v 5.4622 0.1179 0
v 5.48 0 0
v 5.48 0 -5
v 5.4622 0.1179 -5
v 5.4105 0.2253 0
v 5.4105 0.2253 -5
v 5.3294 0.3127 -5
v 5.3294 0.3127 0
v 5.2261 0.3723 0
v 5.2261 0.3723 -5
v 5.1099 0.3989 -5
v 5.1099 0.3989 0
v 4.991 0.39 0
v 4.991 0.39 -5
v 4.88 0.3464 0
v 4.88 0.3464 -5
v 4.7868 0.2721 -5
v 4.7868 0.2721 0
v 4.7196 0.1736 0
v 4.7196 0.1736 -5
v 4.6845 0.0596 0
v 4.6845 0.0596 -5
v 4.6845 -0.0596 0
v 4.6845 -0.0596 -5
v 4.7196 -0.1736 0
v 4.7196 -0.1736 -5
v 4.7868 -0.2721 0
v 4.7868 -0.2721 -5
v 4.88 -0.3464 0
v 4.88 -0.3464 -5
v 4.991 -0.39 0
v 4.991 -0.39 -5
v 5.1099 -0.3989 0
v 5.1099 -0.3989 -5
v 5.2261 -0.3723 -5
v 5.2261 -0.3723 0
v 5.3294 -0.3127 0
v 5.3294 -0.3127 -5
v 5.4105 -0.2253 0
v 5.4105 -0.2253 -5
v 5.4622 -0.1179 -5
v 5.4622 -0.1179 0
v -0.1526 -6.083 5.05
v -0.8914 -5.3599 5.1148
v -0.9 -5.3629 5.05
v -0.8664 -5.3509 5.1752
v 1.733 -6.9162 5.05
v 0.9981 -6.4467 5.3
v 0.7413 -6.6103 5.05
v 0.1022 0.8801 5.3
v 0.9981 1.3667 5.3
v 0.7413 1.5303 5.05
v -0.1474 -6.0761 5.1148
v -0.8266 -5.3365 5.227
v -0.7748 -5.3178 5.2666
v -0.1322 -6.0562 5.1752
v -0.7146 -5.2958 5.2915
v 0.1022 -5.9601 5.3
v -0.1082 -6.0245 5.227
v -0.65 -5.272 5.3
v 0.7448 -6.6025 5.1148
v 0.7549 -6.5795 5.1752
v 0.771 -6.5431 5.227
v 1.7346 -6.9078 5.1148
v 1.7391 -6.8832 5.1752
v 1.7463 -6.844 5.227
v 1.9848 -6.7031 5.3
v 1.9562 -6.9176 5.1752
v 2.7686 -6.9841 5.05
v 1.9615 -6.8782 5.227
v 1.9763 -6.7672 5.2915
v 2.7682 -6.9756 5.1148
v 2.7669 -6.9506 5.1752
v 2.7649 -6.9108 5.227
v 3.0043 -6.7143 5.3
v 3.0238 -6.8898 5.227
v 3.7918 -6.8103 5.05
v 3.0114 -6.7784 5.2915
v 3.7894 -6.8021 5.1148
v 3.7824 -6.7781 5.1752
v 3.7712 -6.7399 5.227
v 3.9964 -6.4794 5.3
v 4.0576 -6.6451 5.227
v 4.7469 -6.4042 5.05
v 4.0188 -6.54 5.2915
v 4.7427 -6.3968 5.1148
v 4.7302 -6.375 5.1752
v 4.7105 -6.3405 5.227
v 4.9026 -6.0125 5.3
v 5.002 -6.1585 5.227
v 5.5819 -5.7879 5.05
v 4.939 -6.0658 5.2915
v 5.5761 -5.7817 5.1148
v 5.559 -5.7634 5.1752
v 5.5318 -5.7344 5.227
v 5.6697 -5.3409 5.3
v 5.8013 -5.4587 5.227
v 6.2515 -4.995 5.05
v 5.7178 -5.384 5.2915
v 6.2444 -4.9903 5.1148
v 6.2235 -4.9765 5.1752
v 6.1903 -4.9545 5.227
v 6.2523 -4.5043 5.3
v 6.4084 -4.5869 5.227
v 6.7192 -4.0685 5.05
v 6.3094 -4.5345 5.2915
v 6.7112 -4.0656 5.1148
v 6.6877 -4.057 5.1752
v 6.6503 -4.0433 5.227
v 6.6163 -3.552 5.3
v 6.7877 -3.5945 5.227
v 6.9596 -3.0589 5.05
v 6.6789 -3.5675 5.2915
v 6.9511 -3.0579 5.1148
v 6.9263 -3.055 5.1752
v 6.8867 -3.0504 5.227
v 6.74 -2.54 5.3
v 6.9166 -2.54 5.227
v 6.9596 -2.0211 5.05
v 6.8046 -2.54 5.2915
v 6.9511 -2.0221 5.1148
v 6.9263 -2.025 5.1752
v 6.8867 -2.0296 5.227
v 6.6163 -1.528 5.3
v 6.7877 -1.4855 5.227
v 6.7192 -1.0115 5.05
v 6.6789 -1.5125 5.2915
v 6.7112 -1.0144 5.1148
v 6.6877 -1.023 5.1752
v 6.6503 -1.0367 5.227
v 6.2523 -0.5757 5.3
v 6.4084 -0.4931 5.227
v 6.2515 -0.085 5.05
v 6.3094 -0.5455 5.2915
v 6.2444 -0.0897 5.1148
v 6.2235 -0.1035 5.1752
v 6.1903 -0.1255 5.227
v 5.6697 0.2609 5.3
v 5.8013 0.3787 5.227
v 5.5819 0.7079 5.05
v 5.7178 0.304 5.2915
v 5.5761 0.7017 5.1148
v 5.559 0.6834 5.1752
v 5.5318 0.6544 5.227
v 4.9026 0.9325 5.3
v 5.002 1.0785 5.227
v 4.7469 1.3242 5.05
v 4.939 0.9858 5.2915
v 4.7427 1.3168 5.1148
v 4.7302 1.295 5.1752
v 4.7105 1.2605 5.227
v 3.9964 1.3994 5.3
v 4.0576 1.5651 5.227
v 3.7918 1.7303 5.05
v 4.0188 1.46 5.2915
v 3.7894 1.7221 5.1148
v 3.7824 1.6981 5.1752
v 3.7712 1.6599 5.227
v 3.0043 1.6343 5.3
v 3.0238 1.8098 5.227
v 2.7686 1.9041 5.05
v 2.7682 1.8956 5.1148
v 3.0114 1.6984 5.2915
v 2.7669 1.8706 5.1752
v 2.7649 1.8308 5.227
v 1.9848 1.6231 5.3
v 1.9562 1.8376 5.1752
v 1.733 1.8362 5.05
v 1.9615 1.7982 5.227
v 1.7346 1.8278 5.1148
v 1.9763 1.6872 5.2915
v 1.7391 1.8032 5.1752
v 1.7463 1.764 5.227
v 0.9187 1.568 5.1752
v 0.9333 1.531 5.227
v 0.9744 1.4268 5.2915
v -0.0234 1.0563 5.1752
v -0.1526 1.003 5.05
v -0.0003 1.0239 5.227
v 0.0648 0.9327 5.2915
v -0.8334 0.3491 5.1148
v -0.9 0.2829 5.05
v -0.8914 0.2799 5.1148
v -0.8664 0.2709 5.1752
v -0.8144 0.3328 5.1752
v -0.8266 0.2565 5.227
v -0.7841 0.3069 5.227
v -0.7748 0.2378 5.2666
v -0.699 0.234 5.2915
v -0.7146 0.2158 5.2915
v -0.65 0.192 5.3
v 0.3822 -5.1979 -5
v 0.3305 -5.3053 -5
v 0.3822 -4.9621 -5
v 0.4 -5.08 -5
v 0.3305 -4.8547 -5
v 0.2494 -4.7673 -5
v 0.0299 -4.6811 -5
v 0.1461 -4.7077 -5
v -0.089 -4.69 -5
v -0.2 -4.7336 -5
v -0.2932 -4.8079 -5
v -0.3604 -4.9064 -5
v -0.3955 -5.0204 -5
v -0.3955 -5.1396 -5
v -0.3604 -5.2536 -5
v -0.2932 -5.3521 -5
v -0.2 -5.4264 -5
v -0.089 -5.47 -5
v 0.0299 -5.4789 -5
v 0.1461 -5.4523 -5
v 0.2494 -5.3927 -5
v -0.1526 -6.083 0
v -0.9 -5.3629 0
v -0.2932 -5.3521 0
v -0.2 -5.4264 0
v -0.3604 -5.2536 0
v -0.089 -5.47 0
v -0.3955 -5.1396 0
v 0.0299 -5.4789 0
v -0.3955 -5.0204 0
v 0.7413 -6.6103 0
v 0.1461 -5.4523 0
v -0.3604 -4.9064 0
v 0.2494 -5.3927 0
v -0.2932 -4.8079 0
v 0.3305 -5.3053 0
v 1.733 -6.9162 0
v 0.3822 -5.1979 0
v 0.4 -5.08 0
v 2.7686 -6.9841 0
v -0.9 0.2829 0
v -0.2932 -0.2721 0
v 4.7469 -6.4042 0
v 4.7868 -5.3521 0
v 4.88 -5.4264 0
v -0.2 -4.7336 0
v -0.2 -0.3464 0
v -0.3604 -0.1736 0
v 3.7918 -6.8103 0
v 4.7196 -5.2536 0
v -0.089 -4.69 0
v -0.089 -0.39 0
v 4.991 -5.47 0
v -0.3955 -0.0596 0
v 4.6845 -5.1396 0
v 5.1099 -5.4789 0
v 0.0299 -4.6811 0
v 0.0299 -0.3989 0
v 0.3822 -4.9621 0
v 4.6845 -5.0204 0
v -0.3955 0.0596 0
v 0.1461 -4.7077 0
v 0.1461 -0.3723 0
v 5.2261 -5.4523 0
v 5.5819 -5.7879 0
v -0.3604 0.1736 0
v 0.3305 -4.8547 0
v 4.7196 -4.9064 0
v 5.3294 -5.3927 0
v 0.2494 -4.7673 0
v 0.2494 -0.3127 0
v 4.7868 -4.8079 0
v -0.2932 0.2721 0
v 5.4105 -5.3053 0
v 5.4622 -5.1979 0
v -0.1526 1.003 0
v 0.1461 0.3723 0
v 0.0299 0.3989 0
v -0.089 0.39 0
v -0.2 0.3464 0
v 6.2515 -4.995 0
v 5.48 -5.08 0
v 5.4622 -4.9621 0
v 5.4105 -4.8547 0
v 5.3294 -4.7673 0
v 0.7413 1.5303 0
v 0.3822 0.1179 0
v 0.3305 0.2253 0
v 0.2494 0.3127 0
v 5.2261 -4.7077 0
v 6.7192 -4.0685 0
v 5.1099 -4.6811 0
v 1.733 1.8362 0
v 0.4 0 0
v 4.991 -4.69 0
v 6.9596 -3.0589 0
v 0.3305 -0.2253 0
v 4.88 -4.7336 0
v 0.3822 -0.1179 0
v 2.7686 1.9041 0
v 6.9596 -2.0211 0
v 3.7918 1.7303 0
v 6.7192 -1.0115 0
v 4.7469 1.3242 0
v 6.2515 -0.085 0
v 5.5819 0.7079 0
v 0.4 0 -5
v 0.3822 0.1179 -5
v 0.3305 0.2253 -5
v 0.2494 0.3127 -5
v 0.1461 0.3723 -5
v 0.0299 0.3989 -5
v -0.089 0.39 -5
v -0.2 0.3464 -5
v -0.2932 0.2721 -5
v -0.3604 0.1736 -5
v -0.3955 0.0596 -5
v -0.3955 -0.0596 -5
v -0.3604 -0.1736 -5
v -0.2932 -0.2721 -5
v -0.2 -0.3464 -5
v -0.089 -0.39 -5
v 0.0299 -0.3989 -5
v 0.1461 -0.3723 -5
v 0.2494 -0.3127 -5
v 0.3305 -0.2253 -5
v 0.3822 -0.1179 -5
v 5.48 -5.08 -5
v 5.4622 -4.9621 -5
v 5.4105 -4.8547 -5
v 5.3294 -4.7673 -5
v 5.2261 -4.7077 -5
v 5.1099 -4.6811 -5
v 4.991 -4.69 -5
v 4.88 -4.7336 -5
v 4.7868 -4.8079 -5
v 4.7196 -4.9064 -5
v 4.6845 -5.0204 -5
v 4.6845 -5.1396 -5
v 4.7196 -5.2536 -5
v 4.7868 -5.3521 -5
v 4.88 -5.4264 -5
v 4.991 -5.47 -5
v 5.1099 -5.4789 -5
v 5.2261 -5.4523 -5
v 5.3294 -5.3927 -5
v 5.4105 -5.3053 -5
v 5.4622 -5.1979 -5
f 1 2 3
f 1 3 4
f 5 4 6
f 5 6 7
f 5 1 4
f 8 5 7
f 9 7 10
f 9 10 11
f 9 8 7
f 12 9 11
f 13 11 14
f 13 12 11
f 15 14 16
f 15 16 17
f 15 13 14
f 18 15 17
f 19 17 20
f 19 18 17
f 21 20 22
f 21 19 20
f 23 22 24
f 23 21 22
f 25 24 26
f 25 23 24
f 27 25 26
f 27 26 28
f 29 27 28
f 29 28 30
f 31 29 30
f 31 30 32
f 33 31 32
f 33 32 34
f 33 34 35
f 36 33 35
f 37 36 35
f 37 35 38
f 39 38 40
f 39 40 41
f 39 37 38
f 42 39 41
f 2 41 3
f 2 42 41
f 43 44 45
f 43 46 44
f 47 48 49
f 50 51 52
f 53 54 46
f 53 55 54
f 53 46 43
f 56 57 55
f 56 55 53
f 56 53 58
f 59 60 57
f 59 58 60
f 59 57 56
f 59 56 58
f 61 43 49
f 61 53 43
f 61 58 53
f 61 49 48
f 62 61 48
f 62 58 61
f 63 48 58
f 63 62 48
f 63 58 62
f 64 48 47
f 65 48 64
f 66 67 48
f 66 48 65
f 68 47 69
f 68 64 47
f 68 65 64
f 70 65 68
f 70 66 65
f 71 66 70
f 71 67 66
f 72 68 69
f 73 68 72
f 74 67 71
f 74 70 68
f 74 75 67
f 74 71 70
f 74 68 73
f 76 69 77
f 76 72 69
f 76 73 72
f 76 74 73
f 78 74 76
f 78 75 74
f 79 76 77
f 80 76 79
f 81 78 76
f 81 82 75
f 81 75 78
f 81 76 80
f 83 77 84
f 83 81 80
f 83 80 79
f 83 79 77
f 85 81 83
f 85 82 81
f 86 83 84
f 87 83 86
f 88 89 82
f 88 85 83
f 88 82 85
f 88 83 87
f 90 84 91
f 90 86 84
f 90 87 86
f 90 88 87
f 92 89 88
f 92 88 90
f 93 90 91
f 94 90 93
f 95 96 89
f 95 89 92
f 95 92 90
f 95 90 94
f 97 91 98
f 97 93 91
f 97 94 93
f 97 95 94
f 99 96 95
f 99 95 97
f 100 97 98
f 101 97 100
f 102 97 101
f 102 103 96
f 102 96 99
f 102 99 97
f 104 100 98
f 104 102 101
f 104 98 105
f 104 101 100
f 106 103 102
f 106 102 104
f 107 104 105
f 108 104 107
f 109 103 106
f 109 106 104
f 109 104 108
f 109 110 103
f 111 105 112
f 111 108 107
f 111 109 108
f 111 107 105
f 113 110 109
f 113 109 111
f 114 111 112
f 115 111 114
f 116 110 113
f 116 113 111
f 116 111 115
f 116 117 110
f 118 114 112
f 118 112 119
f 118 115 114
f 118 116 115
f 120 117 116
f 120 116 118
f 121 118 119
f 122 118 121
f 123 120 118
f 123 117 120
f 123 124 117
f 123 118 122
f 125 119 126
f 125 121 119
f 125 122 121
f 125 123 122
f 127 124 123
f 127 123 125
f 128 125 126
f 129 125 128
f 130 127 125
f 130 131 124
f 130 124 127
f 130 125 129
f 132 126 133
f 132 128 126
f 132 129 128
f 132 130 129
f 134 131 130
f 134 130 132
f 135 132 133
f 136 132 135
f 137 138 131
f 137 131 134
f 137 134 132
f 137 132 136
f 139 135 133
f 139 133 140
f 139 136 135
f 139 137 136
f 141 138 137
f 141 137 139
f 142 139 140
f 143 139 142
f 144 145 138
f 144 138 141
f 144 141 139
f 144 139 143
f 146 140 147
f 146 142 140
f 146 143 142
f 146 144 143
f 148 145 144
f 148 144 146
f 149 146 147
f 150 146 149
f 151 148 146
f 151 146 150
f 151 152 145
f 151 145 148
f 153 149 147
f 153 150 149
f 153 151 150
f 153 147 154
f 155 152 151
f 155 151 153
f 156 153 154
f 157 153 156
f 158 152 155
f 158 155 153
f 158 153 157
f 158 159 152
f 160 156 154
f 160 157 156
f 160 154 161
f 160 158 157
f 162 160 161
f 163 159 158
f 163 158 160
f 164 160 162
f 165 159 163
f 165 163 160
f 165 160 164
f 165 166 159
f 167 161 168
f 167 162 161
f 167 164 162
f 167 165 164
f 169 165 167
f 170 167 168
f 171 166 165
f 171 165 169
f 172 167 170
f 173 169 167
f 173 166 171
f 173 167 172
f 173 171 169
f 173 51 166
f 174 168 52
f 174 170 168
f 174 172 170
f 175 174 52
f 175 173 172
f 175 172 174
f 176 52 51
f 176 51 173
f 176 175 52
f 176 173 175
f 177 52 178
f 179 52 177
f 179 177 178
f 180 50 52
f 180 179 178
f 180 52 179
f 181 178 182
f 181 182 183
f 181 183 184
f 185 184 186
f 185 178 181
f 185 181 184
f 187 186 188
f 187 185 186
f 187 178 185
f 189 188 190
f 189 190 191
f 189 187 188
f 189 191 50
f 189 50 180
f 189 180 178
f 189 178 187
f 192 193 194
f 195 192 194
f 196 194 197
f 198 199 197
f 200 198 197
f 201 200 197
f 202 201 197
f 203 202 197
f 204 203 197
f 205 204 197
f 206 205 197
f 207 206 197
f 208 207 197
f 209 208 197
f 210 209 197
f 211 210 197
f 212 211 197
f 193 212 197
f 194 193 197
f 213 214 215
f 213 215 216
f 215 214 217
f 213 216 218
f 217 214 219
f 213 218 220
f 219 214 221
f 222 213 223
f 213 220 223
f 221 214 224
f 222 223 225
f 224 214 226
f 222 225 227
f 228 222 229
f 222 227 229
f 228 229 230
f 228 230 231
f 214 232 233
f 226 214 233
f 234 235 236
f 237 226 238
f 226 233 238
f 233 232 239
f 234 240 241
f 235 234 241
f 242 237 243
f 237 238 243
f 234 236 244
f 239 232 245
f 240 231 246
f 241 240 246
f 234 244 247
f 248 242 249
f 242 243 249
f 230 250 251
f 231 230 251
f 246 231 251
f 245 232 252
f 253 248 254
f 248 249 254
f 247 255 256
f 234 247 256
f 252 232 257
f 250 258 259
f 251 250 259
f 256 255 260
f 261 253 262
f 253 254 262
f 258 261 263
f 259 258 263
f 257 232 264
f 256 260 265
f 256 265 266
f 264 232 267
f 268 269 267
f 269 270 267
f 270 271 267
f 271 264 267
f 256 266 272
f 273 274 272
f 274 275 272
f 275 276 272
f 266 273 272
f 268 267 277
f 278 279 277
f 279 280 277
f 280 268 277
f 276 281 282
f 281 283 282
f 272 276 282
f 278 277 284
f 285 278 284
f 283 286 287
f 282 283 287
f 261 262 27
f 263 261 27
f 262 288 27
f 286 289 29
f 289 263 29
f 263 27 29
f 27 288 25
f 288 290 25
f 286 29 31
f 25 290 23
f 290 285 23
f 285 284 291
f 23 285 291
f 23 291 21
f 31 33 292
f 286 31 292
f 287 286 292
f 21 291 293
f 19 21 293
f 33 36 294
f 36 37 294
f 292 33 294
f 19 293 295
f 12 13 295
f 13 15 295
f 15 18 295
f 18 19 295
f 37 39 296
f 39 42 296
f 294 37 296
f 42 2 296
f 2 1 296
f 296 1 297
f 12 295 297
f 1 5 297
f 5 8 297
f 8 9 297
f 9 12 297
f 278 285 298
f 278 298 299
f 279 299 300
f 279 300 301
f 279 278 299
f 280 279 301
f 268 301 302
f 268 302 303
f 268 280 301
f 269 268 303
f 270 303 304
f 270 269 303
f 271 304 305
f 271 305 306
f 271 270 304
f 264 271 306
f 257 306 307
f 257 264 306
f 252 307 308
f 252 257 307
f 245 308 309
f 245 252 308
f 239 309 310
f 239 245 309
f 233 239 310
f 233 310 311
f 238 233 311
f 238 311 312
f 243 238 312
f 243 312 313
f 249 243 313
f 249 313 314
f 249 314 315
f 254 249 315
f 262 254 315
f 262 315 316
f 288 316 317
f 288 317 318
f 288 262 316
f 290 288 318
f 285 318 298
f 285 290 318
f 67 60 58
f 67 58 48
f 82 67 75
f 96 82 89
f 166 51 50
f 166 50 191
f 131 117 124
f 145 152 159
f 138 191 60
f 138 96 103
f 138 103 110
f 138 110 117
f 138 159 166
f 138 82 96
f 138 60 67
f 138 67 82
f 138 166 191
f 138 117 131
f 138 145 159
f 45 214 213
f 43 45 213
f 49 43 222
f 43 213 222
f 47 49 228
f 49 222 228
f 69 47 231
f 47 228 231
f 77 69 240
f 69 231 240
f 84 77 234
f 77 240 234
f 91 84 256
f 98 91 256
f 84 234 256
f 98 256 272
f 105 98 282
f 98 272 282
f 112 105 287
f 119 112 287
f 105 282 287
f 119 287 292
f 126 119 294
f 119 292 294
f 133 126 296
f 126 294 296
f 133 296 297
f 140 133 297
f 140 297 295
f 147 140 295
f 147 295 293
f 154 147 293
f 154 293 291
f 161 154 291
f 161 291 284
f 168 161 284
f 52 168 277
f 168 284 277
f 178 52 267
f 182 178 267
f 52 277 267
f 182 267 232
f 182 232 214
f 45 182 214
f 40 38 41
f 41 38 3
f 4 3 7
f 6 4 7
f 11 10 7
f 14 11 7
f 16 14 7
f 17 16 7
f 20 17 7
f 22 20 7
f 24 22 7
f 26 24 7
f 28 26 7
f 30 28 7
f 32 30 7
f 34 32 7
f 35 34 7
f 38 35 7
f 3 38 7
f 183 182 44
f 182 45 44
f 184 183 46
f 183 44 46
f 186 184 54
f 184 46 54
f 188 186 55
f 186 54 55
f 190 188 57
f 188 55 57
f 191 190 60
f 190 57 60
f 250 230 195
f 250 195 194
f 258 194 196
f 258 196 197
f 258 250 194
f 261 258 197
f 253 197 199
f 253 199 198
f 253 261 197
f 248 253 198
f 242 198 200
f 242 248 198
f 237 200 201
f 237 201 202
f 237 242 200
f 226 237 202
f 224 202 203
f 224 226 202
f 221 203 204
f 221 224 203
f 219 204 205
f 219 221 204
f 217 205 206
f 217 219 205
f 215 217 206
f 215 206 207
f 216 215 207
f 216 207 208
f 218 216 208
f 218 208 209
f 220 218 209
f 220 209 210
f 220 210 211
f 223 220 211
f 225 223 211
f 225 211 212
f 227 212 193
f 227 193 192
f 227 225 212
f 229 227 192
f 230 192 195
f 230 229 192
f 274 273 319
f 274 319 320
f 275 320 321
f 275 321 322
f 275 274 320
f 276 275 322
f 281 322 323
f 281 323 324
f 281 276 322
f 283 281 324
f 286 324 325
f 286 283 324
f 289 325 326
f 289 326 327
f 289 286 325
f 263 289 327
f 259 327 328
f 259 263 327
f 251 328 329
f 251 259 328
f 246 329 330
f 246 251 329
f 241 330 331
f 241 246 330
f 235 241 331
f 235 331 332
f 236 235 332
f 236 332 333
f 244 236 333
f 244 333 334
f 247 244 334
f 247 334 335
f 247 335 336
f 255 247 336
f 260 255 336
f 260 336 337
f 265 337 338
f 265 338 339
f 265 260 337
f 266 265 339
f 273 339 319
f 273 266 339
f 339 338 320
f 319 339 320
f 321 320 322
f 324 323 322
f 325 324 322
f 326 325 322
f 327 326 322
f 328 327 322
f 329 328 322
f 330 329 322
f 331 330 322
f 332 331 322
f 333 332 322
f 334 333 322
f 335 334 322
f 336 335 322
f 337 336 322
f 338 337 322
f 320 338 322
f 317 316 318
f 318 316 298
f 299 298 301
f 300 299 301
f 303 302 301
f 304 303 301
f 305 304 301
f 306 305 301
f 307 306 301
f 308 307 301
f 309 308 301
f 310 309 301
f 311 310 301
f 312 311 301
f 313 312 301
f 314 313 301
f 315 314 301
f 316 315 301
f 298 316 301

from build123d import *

# Parameters (mm, degrees)
PAD001_DEPTH = 5.3
FILLET_R     = 0.25
SKETCH_R     = 0.4
PAD_DEPTH    = 5


with BuildPart() as fillet_body:
    # Sketch001 → Pad001 (new body)
    with BuildSketch(Plane.XY):
        with BuildLine():
            Line((-0.9, 0.282924), (-0.9, -5.362924))
            ThreePointArc((-0.9, -5.362924), (6.99, -2.54), (-0.9, 0.282924))
        make_face()
    extrude(amount=PAD001_DEPTH)

    # Fillet
    fillet_edges = [fillet_body.edges().sort_by_distance(p)[0] for p in [
        (-0.9, -2.54, 5.3),
        (6.99, -2.54, 5.3),
    ]]
    fillet(fillet_edges, radius=FILLET_R)


with BuildPart() as diode_bridge_round_d8_9mm:
    # Sketch → Pad (new body)
    with BuildSketch(Plane.XY):
        Circle(SKETCH_R)
        with Locations((5.08, 0)):
            Circle(SKETCH_R)
        with Locations((5.08, -5.08)):
            Circle(SKETCH_R)
        with Locations((0, -5.08)):
            Circle(SKETCH_R)
    extrude(amount=-PAD_DEPTH)

    # Pad_mp_cp: union Fillet body
    add(fillet_body.part)


solid = diode_bridge_round_d8_9mm.part
